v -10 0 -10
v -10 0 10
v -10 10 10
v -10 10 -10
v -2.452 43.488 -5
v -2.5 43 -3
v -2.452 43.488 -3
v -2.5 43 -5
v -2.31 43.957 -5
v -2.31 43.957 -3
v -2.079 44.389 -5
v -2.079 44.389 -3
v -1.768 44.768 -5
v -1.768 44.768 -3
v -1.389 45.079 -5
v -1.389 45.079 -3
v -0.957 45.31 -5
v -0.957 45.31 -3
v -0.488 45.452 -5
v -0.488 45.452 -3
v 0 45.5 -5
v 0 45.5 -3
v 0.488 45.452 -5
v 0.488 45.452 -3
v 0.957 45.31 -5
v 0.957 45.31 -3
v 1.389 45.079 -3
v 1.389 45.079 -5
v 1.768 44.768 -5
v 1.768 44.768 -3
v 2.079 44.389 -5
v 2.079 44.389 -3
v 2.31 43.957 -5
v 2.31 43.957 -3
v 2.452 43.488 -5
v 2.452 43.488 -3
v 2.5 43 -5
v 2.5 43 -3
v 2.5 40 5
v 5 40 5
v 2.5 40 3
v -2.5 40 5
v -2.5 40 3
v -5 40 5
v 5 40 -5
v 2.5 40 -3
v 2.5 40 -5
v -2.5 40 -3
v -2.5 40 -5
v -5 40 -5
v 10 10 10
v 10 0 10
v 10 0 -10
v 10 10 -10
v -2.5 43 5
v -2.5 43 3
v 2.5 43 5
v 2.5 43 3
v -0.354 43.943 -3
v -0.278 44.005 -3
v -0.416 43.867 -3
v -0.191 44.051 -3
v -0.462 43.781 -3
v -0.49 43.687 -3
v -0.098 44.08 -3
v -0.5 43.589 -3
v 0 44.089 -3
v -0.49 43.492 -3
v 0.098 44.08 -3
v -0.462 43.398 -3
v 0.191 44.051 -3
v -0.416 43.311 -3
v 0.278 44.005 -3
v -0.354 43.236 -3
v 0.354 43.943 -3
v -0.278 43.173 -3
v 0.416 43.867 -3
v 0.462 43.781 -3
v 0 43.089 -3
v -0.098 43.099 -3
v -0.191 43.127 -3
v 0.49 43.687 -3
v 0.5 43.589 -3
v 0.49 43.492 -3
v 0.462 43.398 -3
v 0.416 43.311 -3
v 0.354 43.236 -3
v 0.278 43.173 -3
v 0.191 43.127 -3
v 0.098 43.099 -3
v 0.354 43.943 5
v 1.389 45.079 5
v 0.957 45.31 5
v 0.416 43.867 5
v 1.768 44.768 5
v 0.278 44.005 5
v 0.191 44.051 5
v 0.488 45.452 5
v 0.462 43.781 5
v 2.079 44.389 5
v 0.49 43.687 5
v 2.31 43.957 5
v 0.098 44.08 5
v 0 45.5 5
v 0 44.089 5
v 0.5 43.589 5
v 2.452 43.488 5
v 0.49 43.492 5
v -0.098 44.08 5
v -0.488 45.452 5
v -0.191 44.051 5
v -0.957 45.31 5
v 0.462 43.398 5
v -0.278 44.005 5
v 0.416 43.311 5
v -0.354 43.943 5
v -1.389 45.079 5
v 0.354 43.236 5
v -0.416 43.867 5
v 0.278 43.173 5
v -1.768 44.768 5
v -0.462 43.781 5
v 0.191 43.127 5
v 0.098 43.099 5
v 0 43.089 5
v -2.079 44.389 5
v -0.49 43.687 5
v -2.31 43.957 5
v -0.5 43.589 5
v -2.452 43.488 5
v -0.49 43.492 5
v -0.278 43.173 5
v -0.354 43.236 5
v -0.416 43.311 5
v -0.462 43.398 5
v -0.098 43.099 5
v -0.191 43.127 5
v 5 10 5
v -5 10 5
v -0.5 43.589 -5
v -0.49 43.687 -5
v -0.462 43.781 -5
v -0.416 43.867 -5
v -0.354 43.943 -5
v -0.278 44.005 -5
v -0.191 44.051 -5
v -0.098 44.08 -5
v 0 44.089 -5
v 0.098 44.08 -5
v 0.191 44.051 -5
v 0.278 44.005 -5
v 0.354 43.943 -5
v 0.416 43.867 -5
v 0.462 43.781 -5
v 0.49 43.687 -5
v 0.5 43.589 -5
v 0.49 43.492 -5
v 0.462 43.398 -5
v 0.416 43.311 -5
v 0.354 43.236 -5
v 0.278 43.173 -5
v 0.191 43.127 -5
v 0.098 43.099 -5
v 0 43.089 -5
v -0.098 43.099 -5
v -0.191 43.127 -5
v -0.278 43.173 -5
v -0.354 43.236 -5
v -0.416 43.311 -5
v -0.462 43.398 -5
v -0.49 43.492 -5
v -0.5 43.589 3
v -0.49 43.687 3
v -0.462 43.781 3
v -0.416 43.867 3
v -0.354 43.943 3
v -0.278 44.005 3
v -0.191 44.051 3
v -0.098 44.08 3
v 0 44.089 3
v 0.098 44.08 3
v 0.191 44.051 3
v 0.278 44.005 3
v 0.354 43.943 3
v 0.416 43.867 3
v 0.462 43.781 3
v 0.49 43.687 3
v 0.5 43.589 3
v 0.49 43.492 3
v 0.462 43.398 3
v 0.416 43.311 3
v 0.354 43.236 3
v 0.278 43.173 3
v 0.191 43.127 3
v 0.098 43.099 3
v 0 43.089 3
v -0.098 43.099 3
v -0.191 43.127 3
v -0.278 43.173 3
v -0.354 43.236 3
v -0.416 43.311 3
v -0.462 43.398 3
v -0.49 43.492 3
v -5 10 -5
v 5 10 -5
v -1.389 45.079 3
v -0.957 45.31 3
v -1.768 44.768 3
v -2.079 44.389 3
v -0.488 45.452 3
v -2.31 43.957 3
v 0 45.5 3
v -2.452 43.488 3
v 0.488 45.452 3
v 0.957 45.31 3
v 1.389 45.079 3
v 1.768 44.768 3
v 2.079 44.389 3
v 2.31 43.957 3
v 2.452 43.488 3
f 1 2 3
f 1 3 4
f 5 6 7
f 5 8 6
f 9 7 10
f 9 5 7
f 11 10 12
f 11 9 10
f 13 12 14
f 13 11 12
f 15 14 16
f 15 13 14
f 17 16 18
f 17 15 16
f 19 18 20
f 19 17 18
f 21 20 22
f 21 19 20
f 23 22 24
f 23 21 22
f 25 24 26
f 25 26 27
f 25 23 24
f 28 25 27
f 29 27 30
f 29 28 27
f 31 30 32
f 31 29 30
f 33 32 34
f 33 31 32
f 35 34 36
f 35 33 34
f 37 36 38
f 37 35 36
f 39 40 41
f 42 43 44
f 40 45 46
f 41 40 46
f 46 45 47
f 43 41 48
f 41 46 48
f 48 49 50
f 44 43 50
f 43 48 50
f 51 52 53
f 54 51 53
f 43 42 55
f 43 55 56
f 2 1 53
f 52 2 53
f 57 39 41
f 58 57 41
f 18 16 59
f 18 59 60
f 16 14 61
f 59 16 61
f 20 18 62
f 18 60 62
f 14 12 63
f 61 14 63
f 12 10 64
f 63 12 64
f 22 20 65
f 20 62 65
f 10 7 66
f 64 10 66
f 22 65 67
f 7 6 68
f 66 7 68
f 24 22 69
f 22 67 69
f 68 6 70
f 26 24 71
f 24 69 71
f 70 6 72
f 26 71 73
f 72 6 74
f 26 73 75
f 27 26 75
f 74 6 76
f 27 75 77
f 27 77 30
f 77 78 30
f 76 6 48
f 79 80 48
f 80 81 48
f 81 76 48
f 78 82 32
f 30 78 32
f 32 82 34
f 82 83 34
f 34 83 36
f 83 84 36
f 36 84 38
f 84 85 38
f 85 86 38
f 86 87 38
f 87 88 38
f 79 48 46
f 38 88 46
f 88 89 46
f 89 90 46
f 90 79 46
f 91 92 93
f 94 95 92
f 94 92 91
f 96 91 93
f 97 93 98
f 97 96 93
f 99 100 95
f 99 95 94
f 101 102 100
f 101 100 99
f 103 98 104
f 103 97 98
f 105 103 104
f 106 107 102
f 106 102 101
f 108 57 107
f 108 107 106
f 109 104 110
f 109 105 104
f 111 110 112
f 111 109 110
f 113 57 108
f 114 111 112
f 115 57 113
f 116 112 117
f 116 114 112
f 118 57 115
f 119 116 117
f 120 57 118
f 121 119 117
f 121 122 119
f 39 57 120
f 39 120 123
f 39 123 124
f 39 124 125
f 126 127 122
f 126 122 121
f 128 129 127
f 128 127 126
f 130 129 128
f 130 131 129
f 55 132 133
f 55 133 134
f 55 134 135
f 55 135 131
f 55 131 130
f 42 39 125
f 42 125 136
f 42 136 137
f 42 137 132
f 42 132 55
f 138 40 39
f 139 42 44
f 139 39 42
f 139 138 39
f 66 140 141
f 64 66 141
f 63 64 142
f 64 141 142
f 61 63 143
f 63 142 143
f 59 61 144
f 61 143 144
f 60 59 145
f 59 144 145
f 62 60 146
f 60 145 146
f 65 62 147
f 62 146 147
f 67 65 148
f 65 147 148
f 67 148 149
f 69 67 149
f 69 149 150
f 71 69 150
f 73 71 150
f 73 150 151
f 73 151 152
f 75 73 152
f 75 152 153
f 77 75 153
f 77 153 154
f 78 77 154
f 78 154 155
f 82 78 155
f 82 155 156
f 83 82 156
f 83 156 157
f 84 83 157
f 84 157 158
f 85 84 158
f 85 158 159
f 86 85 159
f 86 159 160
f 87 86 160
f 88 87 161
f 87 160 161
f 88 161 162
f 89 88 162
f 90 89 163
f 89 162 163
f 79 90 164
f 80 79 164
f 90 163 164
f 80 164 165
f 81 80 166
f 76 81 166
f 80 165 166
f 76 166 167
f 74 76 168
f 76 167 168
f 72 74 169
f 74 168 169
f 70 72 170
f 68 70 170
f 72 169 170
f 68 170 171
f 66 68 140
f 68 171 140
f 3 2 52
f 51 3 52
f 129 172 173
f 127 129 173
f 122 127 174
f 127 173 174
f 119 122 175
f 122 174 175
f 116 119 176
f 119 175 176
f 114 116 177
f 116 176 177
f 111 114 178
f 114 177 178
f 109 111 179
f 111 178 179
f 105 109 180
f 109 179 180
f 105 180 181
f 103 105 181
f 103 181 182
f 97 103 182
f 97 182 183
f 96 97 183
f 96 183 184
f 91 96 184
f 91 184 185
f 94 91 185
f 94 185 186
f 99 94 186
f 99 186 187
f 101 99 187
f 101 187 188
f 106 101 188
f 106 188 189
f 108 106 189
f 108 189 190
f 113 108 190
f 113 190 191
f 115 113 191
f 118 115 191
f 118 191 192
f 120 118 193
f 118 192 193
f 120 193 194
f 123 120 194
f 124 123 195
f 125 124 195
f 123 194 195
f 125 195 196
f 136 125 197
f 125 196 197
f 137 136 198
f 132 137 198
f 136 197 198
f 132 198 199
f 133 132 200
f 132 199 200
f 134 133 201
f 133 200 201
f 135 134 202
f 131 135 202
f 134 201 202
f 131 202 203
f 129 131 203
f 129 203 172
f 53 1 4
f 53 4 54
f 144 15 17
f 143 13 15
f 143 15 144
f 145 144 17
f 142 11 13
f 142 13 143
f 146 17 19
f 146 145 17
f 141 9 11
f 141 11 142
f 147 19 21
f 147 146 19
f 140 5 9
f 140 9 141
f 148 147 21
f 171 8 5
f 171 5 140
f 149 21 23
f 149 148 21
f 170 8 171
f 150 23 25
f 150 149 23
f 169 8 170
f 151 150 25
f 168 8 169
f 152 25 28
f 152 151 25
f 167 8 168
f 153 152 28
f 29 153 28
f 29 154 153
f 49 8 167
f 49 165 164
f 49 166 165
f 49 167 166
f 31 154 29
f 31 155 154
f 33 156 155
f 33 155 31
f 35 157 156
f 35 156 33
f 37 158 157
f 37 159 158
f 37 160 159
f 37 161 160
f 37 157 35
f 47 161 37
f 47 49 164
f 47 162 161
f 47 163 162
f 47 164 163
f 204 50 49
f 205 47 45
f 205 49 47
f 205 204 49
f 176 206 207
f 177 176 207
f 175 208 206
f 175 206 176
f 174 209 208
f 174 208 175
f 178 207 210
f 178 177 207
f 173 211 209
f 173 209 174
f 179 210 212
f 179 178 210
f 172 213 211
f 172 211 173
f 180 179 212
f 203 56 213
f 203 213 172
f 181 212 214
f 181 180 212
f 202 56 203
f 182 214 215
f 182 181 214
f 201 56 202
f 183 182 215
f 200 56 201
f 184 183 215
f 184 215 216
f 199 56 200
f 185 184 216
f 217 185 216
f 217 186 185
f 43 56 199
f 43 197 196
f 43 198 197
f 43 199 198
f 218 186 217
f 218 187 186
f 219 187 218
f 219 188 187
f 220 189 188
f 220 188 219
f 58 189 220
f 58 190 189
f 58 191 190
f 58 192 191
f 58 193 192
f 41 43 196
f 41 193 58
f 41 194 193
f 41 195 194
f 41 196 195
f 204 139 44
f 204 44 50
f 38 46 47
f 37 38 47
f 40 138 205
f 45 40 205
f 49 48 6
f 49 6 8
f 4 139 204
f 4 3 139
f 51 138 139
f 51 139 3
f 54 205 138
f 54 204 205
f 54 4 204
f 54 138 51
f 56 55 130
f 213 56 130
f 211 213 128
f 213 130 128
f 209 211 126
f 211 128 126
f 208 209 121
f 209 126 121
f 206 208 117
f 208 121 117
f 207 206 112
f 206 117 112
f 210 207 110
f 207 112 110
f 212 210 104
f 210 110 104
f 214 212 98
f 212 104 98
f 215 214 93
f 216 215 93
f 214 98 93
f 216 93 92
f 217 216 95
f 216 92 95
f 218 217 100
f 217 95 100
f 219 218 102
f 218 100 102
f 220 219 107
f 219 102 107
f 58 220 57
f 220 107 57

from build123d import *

# Parameters (mm, degrees)
SKETCH1_W           = 20
SKETCH1_H           = 20
BOSS_EXTRUDE1_DEPTH = 10
SKETCH2_W           = 10
SKETCH2_H           = 10
BOSS_EXTRUDE2_DEPTH = 30
SKETCH3_W           = 5
SKETCH3_H           = 2
BOSS_EXTRUDE3_DEPTH = 3
SKETCH4_R           = 2.5
BOSS_EXTRUDE4_DEPTH = 2
SKETCH5_R           = 0.5
CUT_EXTRUDE1_DEPTH  = 10


with BuildPart() as part:
    # Sketch1 → Boss-Extrude1 (new body)
    with BuildSketch(Plane(origin=(0, 0, 0), x_dir=(1, 0, 0), z_dir=(0, 1, 0))):
        Rectangle(SKETCH1_W, SKETCH1_H)
    extrude(amount=BOSS_EXTRUDE1_DEPTH)

    # Sketch2 → Boss-Extrude2 (add)
    with BuildSketch(Plane(origin=(0, 10, 0), x_dir=(-1, 0, 0), z_dir=(0, -1, 0))):
        Rectangle(SKETCH2_W, SKETCH2_H)
    extrude(amount=-BOSS_EXTRUDE2_DEPTH)

    # Sketch3 → Boss-Extrude3 (add)
    with BuildSketch(Plane(origin=(0, 40, 0), x_dir=(1, 0, 0), z_dir=(0, 1, 0))):
        with Locations((0, 4)):
            Rectangle(SKETCH3_W, SKETCH3_H)
        with Locations((0, -4)):
            Rectangle(SKETCH3_W, SKETCH3_H)
    extrude(amount=BOSS_EXTRUDE3_DEPTH)

    # Sketch4 → Boss-Extrude4 (add)
    with BuildSketch(Plane(origin=(0, 0, -5), x_dir=(1, 0, 0), z_dir=(0, 0, -1))):
        with Locations((0, -43)):
            Circle(SKETCH4_R)
    boss_extrude4 = extrude(amount=-BOSS_EXTRUDE4_DEPTH)

    # Mirror1: Boss-Extrude4 across plane
    add(boss_extrude4.mirror(Plane.XY))

    # Sketch5 → Cut-Extrude1 (cut)
    with BuildSketch(Plane(origin=(0, 0, -5), x_dir=(-1, 0, 0), z_dir=(0, 0, -1))):
        with Locations((0, 43.589170062)):
            Circle(SKETCH5_R)
    extrude(amount=-CUT_EXTRUDE1_DEPTH, mode=Mode.SUBTRACT)


solid = part.part
